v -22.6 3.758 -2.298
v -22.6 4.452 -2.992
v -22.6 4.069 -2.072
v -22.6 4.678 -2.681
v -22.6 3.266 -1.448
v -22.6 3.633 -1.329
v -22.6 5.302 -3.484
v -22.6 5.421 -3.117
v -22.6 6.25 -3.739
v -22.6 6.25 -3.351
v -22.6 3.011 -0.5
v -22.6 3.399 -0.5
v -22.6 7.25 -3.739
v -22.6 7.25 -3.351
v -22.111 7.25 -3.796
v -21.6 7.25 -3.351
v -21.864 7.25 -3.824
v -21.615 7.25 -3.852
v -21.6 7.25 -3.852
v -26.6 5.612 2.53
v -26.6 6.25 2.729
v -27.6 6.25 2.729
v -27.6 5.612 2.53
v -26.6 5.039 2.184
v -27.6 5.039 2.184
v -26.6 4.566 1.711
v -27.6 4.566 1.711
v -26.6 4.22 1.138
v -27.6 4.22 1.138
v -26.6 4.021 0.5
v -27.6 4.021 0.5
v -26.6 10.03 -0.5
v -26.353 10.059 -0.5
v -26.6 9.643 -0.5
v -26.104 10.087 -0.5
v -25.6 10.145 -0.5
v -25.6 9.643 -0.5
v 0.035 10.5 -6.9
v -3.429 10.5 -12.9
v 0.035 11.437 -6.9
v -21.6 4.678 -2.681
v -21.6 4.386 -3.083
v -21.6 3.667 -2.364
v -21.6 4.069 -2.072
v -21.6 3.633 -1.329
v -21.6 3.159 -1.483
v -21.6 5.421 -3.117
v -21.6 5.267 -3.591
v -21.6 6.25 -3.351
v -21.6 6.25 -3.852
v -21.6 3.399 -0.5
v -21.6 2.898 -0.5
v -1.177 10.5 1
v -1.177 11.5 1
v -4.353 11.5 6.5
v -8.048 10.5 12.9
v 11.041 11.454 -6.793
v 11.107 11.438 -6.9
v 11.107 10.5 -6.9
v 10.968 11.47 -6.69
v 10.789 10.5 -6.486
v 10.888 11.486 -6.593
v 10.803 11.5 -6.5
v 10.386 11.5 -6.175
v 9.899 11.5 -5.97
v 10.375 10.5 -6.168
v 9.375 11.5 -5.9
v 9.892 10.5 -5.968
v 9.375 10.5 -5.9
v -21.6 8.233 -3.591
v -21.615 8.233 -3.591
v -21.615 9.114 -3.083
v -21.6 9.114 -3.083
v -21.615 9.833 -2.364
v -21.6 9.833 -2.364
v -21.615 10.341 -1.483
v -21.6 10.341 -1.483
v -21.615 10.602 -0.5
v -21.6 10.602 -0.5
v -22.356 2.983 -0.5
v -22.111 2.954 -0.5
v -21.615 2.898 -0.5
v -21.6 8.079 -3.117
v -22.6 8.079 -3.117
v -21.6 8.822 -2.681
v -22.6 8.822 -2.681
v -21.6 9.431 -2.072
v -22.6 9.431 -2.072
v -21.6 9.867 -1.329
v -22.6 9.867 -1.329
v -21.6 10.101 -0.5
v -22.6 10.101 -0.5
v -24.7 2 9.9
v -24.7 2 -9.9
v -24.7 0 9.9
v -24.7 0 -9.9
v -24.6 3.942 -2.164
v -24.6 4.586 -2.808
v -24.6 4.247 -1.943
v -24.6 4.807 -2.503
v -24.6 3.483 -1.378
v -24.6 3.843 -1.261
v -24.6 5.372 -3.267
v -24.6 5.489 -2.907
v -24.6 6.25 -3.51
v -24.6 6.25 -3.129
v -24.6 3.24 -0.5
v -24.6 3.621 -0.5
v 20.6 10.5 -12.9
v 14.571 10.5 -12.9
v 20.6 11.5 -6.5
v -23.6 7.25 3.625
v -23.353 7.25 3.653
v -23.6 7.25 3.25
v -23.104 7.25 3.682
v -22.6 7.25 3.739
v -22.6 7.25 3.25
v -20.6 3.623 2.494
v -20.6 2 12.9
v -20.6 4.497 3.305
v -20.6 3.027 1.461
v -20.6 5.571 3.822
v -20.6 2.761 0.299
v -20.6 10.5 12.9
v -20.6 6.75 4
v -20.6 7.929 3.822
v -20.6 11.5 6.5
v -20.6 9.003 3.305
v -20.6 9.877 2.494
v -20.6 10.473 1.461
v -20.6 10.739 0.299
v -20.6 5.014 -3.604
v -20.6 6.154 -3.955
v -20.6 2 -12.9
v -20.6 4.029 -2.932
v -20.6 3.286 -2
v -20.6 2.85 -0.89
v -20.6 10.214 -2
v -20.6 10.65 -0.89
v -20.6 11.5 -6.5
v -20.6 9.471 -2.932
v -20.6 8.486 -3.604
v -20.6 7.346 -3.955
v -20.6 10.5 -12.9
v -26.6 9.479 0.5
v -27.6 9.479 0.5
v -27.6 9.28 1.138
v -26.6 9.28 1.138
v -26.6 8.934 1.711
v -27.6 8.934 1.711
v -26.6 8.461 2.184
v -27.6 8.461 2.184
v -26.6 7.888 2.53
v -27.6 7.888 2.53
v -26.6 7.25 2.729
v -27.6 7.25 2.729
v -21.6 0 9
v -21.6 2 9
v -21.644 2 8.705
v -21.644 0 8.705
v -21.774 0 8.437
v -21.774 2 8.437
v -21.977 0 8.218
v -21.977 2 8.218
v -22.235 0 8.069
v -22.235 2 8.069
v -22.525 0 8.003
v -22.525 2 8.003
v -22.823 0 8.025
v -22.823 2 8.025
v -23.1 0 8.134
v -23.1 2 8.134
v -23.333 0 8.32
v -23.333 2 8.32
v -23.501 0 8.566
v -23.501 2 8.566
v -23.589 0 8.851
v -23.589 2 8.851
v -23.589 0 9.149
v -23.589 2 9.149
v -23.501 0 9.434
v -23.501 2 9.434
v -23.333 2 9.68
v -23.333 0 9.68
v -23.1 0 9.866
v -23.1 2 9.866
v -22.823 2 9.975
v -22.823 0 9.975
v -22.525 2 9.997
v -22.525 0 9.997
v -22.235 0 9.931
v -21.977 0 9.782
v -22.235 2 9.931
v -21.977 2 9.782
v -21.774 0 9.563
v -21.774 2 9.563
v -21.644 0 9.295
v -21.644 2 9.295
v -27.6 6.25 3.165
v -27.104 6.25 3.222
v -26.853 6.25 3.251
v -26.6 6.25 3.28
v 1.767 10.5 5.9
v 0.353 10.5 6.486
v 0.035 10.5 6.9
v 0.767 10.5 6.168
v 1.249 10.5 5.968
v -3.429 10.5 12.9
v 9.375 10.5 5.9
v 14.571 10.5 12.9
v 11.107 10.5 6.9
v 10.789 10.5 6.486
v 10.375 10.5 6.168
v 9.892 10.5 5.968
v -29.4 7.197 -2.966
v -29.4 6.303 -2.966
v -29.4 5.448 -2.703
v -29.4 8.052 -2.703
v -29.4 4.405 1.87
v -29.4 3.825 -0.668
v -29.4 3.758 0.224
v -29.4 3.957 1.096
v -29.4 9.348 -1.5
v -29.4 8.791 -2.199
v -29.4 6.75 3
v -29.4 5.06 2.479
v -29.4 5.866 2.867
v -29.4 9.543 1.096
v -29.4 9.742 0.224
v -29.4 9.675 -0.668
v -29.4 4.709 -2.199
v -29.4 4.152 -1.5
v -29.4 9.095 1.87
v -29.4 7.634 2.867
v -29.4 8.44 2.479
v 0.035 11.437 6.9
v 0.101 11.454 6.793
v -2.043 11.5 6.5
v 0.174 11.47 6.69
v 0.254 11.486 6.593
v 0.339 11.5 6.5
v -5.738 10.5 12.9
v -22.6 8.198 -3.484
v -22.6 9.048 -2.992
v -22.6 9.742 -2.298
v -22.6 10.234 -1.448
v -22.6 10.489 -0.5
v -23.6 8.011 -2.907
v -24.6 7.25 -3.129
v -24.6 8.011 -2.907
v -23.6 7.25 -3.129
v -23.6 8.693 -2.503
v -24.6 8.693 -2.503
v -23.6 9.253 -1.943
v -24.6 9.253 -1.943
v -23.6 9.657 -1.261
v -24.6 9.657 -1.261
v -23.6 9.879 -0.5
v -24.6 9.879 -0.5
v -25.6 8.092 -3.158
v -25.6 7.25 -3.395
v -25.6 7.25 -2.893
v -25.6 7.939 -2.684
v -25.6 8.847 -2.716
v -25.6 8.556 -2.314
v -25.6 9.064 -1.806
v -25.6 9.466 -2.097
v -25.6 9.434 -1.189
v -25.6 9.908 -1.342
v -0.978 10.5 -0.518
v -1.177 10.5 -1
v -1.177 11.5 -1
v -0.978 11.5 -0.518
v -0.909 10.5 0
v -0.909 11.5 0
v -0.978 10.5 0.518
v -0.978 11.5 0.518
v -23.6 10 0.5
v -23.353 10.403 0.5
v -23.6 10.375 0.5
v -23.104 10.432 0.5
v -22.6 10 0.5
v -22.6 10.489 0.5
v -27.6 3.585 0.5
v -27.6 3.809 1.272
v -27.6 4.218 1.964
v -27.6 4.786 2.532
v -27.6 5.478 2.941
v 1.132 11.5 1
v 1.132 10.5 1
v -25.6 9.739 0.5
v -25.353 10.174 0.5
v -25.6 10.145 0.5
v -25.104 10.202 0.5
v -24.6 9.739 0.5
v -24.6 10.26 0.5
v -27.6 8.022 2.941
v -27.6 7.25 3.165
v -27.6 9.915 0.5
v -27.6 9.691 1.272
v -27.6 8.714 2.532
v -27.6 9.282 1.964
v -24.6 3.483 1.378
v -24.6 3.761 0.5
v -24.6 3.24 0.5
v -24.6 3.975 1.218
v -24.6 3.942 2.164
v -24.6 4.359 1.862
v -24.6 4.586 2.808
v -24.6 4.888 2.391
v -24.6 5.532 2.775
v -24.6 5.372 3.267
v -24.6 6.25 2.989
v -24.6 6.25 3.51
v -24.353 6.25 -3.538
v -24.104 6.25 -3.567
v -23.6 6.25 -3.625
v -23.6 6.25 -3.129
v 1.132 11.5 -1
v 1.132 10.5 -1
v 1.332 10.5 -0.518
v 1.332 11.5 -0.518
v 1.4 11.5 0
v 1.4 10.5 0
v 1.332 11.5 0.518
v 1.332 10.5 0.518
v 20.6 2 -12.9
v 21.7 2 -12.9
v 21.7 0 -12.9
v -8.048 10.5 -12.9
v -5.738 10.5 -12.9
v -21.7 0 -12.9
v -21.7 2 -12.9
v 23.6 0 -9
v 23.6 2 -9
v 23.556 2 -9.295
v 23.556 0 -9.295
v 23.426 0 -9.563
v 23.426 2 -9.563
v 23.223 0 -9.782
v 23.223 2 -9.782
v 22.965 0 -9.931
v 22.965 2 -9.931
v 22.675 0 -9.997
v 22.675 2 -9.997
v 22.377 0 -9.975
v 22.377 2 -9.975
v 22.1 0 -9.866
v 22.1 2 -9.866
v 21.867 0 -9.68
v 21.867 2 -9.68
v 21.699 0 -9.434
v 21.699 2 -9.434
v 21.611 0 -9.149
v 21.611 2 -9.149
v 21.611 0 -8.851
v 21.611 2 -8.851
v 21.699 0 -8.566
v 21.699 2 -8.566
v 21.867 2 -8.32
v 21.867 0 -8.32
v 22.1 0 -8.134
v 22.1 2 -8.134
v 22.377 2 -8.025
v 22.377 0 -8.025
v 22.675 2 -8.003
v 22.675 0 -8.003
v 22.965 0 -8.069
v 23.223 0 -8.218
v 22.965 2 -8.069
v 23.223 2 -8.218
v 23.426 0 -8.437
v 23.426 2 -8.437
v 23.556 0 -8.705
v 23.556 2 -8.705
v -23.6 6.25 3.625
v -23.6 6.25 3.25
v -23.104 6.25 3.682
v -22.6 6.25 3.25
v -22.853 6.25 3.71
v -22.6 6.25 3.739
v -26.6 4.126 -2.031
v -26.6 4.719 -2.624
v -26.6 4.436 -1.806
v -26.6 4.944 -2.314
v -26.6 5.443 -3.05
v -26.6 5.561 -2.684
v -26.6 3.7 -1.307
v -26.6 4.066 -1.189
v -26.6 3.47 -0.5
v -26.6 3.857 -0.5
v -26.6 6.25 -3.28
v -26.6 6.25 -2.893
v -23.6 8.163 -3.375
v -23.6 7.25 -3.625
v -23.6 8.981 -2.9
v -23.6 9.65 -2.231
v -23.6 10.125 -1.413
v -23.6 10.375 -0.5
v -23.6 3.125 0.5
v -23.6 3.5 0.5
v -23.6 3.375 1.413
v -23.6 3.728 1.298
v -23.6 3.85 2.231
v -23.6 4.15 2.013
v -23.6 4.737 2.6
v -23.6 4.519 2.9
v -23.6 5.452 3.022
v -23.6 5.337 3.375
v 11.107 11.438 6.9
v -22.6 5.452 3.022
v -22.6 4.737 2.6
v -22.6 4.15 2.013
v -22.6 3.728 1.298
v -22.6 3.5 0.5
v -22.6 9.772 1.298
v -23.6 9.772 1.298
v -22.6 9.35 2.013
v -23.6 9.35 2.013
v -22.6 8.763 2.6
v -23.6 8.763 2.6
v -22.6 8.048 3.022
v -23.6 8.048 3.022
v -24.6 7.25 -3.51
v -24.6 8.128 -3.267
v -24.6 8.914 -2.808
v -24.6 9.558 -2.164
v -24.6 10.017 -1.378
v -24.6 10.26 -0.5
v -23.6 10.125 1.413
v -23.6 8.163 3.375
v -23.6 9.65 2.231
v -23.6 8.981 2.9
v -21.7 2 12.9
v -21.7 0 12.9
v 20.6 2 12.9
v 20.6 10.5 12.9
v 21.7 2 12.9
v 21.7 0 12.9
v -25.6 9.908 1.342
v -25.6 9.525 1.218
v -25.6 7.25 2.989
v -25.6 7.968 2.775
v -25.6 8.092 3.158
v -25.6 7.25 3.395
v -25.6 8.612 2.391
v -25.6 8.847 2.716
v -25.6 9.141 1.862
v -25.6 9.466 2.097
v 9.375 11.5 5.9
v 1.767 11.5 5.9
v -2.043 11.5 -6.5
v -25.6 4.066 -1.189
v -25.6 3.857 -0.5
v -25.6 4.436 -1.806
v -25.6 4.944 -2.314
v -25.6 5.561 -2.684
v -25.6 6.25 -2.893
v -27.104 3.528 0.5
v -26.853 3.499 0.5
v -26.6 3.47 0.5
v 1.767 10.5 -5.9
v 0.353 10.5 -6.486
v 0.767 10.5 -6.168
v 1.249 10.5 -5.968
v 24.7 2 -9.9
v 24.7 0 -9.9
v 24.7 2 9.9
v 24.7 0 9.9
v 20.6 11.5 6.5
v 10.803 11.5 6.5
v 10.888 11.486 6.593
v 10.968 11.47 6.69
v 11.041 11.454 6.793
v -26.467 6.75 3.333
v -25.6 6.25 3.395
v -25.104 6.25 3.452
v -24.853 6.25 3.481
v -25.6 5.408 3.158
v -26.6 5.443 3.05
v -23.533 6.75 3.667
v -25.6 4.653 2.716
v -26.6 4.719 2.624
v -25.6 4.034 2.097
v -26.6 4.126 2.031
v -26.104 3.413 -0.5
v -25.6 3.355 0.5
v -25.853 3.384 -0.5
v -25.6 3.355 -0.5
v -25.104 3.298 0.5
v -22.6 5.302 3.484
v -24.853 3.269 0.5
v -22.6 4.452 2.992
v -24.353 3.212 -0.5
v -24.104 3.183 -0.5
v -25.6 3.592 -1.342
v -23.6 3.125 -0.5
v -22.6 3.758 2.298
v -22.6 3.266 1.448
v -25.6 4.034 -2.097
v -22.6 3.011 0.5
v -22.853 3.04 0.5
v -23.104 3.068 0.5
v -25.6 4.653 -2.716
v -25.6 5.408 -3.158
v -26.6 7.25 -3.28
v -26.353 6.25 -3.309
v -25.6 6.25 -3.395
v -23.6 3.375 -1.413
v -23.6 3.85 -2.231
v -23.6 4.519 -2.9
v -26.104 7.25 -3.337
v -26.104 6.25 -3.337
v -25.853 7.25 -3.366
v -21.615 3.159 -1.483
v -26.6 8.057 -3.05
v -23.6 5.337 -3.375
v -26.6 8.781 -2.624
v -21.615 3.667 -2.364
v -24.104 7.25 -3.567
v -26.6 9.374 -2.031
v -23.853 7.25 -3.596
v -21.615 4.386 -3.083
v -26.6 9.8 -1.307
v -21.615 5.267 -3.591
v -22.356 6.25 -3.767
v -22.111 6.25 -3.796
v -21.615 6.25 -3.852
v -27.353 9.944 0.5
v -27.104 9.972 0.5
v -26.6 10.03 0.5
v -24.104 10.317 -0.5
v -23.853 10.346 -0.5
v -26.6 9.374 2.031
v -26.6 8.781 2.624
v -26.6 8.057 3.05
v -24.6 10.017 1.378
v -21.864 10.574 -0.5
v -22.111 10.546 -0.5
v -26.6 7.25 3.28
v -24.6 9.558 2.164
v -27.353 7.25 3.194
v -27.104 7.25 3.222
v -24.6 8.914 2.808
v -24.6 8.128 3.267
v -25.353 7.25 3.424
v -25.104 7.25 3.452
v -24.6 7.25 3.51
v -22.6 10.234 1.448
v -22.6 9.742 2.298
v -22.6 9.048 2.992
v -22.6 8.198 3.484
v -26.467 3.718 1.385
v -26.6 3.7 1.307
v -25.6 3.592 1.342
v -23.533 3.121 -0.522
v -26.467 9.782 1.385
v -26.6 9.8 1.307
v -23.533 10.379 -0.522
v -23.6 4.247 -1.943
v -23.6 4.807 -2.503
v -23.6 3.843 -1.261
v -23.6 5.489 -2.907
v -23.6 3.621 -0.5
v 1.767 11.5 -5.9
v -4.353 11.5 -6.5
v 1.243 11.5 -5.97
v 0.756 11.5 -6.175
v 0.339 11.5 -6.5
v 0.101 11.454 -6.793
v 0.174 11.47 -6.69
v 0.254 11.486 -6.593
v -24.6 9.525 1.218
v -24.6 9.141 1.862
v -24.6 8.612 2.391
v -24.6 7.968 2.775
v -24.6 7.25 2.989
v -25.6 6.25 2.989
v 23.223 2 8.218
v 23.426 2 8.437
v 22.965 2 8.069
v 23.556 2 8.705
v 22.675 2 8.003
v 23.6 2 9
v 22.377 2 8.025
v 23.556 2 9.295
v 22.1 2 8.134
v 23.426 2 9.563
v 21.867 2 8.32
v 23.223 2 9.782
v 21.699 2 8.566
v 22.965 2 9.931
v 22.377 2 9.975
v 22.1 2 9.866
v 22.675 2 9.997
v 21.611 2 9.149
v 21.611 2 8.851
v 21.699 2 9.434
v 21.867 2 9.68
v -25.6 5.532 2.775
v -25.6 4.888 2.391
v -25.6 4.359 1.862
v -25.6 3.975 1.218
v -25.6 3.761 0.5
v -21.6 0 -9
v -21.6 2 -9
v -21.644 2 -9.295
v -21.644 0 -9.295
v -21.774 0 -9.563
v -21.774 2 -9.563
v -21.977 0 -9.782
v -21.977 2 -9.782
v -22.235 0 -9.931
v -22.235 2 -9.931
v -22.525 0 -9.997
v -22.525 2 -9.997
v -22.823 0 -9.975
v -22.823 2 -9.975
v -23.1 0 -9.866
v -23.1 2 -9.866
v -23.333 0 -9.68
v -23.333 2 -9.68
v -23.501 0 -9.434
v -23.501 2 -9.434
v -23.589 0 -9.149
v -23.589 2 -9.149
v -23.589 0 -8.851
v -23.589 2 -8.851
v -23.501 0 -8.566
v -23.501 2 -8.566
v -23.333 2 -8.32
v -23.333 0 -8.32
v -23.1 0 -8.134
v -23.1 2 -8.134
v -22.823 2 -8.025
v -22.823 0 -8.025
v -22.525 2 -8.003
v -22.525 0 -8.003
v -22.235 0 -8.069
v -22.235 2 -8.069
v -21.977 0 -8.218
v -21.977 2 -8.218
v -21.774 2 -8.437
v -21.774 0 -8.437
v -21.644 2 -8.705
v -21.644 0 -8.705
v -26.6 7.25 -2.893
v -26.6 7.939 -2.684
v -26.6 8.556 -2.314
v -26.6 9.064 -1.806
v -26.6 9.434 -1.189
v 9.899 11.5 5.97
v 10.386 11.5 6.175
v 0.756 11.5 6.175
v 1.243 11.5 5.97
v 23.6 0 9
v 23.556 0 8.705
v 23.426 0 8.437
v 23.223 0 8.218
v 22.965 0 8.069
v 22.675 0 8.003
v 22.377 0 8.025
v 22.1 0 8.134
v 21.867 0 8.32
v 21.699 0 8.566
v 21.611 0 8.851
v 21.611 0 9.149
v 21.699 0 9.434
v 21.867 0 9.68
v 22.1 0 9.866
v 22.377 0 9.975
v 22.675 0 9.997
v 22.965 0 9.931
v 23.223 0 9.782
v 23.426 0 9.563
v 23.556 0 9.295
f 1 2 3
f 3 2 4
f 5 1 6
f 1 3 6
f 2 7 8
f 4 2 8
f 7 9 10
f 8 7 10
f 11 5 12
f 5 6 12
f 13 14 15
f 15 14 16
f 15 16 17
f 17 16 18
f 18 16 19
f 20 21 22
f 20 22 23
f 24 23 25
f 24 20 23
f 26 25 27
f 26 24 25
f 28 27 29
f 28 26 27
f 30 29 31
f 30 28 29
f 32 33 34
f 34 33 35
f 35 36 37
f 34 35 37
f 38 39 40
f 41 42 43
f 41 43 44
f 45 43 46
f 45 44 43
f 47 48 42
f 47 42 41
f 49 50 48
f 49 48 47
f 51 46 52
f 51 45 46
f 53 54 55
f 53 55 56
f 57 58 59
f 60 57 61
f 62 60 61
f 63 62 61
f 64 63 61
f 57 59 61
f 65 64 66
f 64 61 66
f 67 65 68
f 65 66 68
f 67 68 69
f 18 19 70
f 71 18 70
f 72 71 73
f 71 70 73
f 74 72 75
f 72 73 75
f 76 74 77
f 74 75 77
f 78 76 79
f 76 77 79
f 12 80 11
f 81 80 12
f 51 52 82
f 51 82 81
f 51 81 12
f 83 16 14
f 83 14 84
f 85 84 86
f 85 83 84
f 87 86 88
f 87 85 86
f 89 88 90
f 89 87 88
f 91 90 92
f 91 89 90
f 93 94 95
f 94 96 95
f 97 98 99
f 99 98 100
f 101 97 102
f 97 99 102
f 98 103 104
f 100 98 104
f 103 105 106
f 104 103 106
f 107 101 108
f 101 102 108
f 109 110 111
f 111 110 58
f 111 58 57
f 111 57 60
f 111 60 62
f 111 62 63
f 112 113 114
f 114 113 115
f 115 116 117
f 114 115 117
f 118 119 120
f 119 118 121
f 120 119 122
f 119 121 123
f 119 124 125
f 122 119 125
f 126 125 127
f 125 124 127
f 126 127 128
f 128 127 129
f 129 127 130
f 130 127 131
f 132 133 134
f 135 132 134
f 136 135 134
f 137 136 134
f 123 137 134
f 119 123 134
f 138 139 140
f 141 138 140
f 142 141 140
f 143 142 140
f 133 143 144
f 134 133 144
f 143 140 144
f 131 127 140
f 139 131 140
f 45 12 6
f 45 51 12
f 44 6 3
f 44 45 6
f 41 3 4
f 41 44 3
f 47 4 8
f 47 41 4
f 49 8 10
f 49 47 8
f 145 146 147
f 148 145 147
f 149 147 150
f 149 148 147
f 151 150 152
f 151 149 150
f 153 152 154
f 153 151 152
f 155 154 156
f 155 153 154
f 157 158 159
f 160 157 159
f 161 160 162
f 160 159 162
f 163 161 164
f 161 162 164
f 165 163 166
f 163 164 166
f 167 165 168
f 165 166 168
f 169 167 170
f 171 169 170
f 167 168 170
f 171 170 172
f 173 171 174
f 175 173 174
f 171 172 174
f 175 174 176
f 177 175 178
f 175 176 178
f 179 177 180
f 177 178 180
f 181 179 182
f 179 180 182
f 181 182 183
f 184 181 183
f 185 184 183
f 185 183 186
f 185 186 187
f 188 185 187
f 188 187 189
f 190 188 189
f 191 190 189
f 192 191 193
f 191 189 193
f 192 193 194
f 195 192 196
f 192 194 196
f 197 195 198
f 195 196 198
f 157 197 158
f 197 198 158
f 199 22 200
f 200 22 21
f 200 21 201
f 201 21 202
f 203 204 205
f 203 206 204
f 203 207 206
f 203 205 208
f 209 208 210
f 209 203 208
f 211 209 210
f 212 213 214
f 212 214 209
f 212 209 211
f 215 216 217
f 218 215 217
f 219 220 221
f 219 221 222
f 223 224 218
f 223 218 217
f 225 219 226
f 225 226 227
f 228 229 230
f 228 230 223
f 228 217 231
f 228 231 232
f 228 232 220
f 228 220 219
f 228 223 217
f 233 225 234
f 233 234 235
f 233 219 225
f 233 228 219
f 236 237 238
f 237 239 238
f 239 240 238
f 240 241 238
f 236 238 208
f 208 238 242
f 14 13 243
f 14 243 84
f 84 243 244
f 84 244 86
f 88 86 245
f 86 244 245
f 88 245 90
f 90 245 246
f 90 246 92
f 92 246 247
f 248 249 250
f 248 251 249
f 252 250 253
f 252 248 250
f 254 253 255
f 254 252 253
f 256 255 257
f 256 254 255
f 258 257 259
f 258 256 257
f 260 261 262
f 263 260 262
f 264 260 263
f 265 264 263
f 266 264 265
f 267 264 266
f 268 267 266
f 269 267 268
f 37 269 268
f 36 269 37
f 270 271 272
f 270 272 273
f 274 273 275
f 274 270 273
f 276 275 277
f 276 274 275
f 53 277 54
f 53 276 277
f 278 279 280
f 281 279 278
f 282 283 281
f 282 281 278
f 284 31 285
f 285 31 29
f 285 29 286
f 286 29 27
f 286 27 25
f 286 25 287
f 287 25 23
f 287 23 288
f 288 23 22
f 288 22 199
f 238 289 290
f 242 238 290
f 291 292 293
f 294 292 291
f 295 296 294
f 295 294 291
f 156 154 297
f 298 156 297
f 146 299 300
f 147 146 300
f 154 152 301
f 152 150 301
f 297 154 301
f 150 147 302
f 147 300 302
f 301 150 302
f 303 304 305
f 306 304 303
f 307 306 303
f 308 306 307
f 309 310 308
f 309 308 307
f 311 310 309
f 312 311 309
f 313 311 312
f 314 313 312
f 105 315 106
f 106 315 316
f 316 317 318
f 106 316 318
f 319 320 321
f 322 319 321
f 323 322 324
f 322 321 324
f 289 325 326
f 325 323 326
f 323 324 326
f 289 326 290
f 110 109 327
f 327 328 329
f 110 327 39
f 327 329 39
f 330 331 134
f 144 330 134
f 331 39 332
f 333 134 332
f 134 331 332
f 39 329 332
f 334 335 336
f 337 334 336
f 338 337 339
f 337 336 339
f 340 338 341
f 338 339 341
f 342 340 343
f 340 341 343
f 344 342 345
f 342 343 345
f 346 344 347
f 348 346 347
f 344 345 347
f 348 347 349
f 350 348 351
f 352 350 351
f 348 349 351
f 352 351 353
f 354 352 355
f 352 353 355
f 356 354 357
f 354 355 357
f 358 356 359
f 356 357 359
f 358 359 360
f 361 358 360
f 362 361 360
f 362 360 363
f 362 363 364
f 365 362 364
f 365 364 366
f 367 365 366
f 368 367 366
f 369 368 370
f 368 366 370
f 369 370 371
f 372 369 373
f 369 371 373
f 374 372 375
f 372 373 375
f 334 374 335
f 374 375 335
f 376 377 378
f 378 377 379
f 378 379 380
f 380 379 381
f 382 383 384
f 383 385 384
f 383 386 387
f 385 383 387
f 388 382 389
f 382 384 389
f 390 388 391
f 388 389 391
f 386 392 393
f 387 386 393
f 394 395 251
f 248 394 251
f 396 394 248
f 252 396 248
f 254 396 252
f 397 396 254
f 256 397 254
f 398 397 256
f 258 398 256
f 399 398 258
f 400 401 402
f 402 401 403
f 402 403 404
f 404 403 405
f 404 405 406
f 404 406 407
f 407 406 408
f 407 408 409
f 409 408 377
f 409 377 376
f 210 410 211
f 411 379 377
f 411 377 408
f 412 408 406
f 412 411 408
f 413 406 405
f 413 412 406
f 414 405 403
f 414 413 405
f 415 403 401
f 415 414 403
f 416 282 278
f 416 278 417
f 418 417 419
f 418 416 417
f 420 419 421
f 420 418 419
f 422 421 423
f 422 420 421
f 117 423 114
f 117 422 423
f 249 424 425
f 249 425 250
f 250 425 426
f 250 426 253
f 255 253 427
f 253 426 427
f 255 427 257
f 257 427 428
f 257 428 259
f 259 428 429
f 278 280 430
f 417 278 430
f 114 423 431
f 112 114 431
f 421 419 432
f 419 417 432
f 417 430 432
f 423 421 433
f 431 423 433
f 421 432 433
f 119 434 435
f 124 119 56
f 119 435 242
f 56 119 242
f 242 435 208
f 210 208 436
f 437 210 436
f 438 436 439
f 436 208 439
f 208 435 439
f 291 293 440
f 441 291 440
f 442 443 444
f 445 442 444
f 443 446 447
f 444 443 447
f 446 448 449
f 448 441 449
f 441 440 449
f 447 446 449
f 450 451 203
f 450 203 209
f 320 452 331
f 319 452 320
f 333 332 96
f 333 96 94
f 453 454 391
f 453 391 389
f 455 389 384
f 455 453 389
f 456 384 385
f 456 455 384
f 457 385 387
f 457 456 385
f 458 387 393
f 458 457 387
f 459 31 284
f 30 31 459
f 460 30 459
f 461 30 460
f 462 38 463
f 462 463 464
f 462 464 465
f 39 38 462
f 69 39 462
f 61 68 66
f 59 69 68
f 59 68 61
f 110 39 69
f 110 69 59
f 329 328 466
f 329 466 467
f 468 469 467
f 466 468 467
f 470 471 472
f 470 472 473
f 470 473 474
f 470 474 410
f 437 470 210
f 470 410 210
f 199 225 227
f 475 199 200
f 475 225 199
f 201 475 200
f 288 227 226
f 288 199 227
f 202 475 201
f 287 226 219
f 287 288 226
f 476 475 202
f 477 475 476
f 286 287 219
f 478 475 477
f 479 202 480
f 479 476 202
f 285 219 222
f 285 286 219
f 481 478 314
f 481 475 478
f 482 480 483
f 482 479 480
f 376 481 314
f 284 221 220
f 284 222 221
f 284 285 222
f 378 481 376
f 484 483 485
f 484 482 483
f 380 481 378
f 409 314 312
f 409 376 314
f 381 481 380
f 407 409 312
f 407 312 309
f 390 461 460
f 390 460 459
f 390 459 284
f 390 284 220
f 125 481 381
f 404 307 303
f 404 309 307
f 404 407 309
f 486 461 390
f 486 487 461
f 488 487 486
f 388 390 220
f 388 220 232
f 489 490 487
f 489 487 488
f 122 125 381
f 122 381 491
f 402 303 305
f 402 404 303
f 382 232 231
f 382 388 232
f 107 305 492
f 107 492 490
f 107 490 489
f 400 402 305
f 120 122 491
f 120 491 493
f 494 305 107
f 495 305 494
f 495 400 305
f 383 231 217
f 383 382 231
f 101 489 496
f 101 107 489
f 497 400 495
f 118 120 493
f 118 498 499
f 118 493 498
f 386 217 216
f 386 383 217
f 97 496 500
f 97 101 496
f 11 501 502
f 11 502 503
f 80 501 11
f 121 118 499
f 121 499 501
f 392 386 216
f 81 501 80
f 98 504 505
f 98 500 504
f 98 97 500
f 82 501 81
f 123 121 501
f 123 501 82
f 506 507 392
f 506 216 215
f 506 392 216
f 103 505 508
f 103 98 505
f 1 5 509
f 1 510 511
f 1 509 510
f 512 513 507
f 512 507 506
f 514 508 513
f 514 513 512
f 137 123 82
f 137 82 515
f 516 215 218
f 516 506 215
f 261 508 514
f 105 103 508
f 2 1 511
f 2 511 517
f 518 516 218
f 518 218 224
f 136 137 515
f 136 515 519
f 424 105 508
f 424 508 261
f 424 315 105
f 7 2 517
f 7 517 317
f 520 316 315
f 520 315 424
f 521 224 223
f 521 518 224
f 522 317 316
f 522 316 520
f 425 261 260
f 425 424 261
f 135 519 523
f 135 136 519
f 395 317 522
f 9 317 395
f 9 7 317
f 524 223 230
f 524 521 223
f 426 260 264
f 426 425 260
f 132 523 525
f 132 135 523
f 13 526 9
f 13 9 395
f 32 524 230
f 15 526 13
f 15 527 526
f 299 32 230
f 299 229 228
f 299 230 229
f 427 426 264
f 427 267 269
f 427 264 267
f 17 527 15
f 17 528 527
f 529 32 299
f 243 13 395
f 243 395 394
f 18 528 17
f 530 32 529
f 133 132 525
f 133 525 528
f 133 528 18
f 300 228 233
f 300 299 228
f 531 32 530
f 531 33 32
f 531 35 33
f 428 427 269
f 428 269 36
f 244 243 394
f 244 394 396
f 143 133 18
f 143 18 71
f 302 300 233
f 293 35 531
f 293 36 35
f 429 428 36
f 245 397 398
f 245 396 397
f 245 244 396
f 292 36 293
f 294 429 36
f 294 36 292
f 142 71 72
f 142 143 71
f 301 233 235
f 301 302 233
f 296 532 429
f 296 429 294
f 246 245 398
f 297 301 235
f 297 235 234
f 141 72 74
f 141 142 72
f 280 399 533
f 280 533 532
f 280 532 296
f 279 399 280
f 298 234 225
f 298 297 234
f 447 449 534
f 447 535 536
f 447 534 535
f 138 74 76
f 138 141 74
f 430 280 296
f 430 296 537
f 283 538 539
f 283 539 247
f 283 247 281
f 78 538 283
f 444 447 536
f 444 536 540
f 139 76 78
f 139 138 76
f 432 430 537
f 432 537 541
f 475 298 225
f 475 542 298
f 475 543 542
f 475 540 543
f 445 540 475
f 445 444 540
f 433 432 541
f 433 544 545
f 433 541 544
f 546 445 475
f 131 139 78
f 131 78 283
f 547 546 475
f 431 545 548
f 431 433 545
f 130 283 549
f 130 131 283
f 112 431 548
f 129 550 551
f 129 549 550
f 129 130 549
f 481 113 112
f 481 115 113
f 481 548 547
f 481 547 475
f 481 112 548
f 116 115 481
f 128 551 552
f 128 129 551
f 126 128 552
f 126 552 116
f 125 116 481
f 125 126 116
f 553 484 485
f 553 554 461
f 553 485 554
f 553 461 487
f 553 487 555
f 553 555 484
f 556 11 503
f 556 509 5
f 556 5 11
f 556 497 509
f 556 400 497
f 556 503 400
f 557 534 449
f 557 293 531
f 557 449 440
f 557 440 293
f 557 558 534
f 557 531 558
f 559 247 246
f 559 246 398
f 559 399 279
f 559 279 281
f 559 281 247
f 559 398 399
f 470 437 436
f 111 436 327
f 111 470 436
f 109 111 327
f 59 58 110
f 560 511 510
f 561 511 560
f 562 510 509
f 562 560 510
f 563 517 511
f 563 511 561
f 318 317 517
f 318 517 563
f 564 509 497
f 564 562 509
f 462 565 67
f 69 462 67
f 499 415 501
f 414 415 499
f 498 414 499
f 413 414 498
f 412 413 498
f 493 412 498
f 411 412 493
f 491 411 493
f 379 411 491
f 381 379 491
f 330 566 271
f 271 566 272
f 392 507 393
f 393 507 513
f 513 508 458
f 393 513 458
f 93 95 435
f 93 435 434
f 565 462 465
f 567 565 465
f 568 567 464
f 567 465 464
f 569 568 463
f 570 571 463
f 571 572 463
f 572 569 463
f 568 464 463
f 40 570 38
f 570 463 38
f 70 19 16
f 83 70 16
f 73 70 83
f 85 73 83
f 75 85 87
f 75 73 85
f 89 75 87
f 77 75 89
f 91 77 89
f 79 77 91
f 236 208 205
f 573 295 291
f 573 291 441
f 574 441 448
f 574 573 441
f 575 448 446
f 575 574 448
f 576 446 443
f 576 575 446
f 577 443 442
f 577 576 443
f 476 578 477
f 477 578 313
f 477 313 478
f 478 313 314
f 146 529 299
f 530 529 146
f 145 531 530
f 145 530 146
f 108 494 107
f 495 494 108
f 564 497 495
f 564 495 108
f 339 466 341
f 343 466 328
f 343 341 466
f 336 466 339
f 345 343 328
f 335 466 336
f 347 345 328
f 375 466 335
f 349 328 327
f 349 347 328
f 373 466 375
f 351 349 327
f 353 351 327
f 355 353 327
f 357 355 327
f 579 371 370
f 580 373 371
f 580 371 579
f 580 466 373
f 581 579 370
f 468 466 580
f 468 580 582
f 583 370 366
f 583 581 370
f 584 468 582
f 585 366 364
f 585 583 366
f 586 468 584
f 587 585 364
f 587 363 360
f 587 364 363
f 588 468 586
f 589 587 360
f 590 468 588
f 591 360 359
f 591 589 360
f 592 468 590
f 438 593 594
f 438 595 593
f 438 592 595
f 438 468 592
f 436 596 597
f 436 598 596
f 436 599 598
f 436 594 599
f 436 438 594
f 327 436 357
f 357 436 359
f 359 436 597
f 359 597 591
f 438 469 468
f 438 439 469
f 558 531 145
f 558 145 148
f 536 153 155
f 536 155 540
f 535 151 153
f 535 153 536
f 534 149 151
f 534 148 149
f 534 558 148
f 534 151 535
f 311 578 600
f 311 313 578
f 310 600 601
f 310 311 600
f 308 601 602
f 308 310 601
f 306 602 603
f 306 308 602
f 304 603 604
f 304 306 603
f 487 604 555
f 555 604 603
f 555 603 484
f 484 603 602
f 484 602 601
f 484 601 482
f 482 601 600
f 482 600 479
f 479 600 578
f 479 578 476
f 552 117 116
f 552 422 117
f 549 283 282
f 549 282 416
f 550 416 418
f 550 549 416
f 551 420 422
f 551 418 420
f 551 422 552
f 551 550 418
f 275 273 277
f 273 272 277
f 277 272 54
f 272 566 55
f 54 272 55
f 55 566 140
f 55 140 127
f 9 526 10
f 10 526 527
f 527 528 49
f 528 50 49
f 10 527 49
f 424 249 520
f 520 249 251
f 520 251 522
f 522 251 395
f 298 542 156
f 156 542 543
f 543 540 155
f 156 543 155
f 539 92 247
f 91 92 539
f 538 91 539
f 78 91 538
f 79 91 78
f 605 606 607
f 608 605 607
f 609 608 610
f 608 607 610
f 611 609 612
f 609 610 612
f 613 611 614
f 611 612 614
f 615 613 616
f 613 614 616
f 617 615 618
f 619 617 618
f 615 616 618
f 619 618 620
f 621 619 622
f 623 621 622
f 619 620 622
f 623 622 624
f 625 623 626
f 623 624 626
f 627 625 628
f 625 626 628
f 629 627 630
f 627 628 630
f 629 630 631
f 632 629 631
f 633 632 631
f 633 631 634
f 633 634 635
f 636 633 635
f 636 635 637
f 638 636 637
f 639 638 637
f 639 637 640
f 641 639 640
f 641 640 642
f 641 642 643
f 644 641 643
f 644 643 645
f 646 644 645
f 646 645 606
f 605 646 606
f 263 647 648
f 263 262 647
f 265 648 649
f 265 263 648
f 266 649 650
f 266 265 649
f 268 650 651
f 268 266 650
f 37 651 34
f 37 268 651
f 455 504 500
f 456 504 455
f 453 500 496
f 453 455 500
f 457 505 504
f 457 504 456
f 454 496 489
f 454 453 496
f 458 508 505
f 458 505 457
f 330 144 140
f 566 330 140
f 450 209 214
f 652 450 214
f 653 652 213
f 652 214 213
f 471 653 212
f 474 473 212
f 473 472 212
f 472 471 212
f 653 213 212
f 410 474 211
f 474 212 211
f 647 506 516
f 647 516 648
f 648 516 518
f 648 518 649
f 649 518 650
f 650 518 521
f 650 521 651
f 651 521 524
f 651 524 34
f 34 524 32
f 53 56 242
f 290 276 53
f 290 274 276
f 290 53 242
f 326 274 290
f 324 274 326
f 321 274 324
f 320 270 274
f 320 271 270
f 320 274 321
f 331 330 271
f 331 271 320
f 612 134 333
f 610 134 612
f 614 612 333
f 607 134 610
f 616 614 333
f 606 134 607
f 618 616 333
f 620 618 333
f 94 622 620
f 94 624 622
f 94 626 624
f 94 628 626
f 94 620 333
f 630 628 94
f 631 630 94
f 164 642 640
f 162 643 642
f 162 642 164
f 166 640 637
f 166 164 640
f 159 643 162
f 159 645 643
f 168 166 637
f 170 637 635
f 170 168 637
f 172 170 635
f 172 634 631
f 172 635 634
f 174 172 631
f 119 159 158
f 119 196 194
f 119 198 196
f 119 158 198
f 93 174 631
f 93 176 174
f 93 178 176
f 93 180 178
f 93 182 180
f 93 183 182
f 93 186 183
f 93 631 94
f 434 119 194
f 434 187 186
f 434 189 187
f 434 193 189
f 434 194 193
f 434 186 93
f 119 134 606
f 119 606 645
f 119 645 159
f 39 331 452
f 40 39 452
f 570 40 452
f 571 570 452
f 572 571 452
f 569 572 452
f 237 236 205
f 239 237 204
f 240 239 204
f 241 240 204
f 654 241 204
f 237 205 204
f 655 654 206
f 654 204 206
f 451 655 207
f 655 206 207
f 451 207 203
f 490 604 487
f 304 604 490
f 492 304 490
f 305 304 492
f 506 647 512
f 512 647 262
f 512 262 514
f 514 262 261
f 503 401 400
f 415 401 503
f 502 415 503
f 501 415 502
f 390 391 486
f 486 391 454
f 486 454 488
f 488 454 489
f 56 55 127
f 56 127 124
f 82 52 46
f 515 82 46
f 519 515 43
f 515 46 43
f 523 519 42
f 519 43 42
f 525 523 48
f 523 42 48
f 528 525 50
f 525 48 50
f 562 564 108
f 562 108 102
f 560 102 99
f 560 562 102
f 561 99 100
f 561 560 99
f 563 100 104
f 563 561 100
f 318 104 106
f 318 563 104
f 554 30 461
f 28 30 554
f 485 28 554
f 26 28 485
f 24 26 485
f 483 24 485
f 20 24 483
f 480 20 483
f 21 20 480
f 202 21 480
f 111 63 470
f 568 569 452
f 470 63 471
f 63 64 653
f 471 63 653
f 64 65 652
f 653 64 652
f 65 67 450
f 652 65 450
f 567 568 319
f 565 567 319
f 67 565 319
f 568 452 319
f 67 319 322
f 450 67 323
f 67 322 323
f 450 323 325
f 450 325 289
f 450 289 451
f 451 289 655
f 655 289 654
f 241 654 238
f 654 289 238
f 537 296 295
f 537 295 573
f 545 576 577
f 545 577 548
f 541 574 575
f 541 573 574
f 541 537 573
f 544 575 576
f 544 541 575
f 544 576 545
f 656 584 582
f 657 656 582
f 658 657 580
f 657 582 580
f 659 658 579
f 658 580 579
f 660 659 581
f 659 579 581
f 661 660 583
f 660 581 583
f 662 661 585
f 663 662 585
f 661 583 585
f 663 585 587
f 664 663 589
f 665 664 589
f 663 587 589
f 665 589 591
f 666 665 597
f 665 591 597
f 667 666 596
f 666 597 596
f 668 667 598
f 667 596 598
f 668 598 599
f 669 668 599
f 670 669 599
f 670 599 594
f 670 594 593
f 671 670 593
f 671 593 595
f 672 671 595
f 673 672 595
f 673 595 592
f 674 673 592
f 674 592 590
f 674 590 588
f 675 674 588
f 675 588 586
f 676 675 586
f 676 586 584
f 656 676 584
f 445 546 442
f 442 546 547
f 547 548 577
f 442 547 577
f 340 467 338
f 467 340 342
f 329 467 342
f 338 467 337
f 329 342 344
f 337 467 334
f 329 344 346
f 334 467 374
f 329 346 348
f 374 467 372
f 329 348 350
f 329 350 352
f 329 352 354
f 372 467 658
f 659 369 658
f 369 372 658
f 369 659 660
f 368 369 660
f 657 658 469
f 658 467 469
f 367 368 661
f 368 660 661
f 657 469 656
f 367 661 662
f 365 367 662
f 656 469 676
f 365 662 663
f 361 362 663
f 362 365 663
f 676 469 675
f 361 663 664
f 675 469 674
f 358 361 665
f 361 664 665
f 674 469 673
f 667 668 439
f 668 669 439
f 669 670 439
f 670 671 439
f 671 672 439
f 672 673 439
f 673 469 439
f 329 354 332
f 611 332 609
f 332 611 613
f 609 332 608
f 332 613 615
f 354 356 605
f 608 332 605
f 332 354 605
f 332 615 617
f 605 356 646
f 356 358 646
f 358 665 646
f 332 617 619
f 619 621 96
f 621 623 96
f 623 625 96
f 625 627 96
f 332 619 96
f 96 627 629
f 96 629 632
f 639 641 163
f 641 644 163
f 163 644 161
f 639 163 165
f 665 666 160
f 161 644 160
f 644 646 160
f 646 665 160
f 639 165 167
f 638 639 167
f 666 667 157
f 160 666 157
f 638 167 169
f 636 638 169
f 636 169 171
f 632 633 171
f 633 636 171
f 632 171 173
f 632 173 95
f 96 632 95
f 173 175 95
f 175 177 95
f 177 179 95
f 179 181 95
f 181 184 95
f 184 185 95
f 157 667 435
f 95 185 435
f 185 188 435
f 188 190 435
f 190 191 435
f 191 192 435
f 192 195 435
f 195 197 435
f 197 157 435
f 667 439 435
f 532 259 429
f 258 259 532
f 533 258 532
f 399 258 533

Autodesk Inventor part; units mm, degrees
sketch "Sketch1" plane through (0, 0, 0) normal (0, 1, 0) x (-1, 0, 0)
  line L0 (-24.7, -12.9) -> (24.7, -12.9)
  line L1 (24.7, -12.9) -> (24.7, 12.9)
  line L2 (24.7, 12.9) -> (-24.7, 12.9)
  line L3 (-24.7, 12.9) -> (-24.7, -12.9)
  line L4 (-24.7, -12.9) -> (24.7, 12.9) construction
  line L5 (24.7, -12.9) -> (-24.7, 12.9) construction
  point P0 (0, 0)
  dimension "d0" = 49.4
  dimension "d1" = 25.8
extrude "Extrusion1" add sketch "Sketch1" along normal blind 2
chamfer "Chamfer1" distance 3 angle 45 4 edges at (24.7, 1, 12.9) (24.7, 1, -12.9) (-24.7, 1, 12.9) (-24.7, 1, -12.9)
sketch "Sketch2" plane through (0, 2, 0) normal (0, 1, 0) x (1, 0, 0)
  circle A0 centre (22.6, -9) radius 1
  circle A1 centre (22.6, 9) radius 1
  circle A2 centre (-22.6, -9) radius 1
  circle A3 centre (-22.6, 9) radius 1
  line L0 (24.7, -9.9) -> (24.7, 9.9) construction
  line L1 (24.7, 0) -> (-24.7, 0) construction
  line L2 (-24.7, 9.9) -> (-24.7, -9.9) construction
  line L3 (-21.7, -12.9) -> (21.7, -12.9) construction
  line L4 (0, -12.9) -> (0, 13.4418) construction
  point P0 (0, 0)
  dimension "d7" = 2
  dimension "d8" = 45.2
  dimension "d9" = 18
extrude "Extrusion2" cut sketch "Sketch2" against normal up to surface (2 mm away)
ref_plane "Work Plane1" through (0, 0, 9.9) normal (1, 0, 0) x (0, 0, -1)
sketch "Sketch3" plane through (0, 0, 9.9) normal (1, 0, 0) x (0, 0, -1)
  line L0 (22.8, 2) -> (19.8, 2) projected
  line L1 (22.8, 2) -> (22.8, 10.5)
  line L2 (22.8, 10.5) -> (16.4, 11.5)
  line L3 (16.4, 11.5) -> (3.4, 11.5)
  line L4 (3.4, 11.5) -> (-3, 10.5)
  line L5 (-3, 10.5) -> (-3, 2)
  line L6 (-0.1, 2) -> (1.9, 2) projected
  line L7 (22.8, 2) -> (-3, 2)
  line L8 (22.8, 0) -> (22.8, 2) projected
  line L9 (-3, 2) -> (-3, 0) projected
  line L10 (0, 0) -> (19.8, 0) projected
  line L11 (9.9, 0) -> (9.9, 11.5) construction
  line L12 (-3, 0) -> (0, 0) construction
  dimension "d12" = 11.5
  dimension "d13" = 13
  dimension "d14" = 10.5
extrude "Extrusion3" add sketch "Sketch3" along normal mid plane 41.2
sketch "Sketch4" plane through (-20.6, 11.5, 6.5) normal (0, 1, 0) x (1, 0, 0)
  line L0 (42.3, 19.4) -> (-1.1, 19.4) projected
  line L1 (12.5522, 19.4) -> (20, 6.5)
  line L2 (20, 6.5) -> (12.5522, -6.4)
  line L3 (-1.1, -6.4) -> (42.3, -6.4) projected
  line L4 (14.8616, 19.4) -> (22.3094, 6.5)
  line L5 (22.3094, 6.5) -> (14.8616, -6.4)
  line L6 (12.5522, -6.4) -> (14.8616, -6.4)
  line L7 (12.5522, 19.4) -> (14.8616, 19.4)
  line L8 (20.6, 6.5) -> (-4.1, 6.5) construction
  line L9 (-4.1, 16.4) -> (-4.1, -3.4) construction
  line L10 (0, 0) -> (0, 13) construction
  line L11 (17.171, 19.4) -> (21.2124, 12.4)
  line L12 (21.2124, 12.4) -> (31.1295, 12.4)
  line L13 (31.1295, 12.4) -> (35.171, 19.4)
  line L14 (26.171, 12.4) -> (26.171, 19.4) construction
  line L15 (17.171, -6.4) -> (21.2124, 0.6)
  line L16 (21.2124, 0.6) -> (31.1295, 0.6)
  line L17 (31.1295, 0.6) -> (35.171, -6.4)
  point P0 (35.171, -6.4)
  dimension "d17" = 2
  dimension "d18" = 2
  dimension "d19" = 120
  dimension "d20" = 20
  dimension "d21" = 2
  dimension "d22" = 7
  dimension "d23" = 18
extrude "Extrusion4" cut sketch "Sketch4" against normal blind 1
fillet "Fillet1" radius 2 6 edges at (1.7094, 11, 0) (-0.6, 11, 0) (0.6124, 11, 5.9) (10.5295, 11, 5.9) (10.5295, 11, -5.9) (0.6124, 11, -5.9)
sketch "Sketch6" plane through (-20.6, 0, 9.9) normal (-1, 0, 0) x (0, 0, 1)
  circle A0 centre (-9.9, 6.75) radius 4
  line L0 (-16.4, 11.5) -> (-3.4, 11.5) construction
  line L1 (-9.9, 11.5) -> (-9.9, 0) construction
  line L2 (-22.8, 2) -> (-22.8, 10.5) construction
  line L3 (-22.8, 6.75) -> (3, 6.75) construction
  line L4 (3, 10.5) -> (3, 2) construction
  point P0 (-9.9, 6.75)
  dimension "d27" = 8
  dimension "d28" = 4.75
ref_plane "Work Plane2" through (-29.4, 0, 9.9) normal (-1, 0, 0) x (0, 0, 1)
sketch "Sketch7" plane through (-29.4, 0, 9.9) normal (-1, 0, 0) x (0, 0, 1)
  circle A0 centre (-9.9, 6.75) radius 3
  point P0 (-9.9, 0)
  dimension "d30" = 6
loft "Loft1" add profiles "Sketch6", "Sketch7"
ref_plane "Work Plane3" through (-21.6, 0, 9.9) normal (-1, 0, 0) x (0, 0, 1)
sketch "Sketch8" plane through (-21.6, 0, 9.9) normal (-1, 0, 0) x (0, 0, 1)
  circle A0 centre (-9.9, 6.75) radius 4 projected
  circle A1 centre (-9.9, 6.75) radius 3.8847
  circle A2 centre (-9.9, 6.75) radius 3.388
  line L0 (-9.4, 2.75) -> (-10.4, 2.75)
  line L1 (-10.4, 2.75) -> (-10.4, 10.75)
  line L2 (-10.4, 10.75) -> (-9.4, 10.75)
  line L3 (-9.4, 10.75) -> (-9.4, 2.75)
  line L4 (-9.4, 2.75) -> (-10.4, 10.75) construction
  line L5 (-10.4, 2.75) -> (-9.4, 10.75) construction
  line L6 (-5.9, 7.25) -> (-13.9, 7.25)
  line L7 (-13.9, 7.25) -> (-13.9, 6.25)
  line L8 (-13.9, 6.25) -> (-5.9, 6.25)
  line L9 (-5.9, 6.25) -> (-5.9, 7.25)
  line L10 (-5.9, 7.25) -> (-13.9, 6.25) construction
  line L11 (-13.9, 7.25) -> (-5.9, 6.25) construction
  point P0 (-9.9, 0)
  point P1 (-13.2509, 6.25)
  point P2 (-13.7524, 6.25)
  point P3 (-10.4, 2.8976)
  point P4 (-10.4, 3.3991)
  point P5 (-13.7524, 7.25)
  point P6 (-13.2509, 7.25)
  point P7 (-10.4, 10.1009)
  point P8 (-10.4, 10.6024)
  dimension "d36" = 6.776
  dimension "d37" = 1
  dimension "d38" = 1
extrude "Extrusion5" cut sketch "Sketch8" along normal blind 1 contours L1 A2 L6 A1 | A1 L8 A2 L1
ref_plane "Work Plane4" through (-22.6, 0, 9.9) normal (-1, 0, 0) x (0, 0, 1)
sketch "Sketch9" plane through (-22.6, 0, 9.9) normal (-1, 0, 0) x (0, 0, 1)
  circle A0 centre (-9.9, 6.75) radius 4 projected
  circle A1 centre (-9.9, 6.75) radius 4
  circle A2 centre (-9.9, 6.75) radius 3.2885
  line L0 (-9.4, 2.75) -> (-10.4, 2.75)
  line L1 (-10.4, 2.75) -> (-10.4, 10.75)
  line L2 (-10.4, 10.75) -> (-9.4, 10.75)
  line L3 (-9.4, 10.75) -> (-9.4, 2.75)
  line L4 (-9.4, 2.75) -> (-10.4, 10.75) construction
  line L5 (-10.4, 2.75) -> (-9.4, 10.75) construction
  line L6 (-5.9, 7.25) -> (-13.9, 7.25)
  line L7 (-13.9, 7.25) -> (-13.9, 6.25)
  line L8 (-13.9, 6.25) -> (-5.9, 6.25)
  line L9 (-5.9, 6.25) -> (-5.9, 7.25)
  line L10 (-5.9, 7.25) -> (-13.9, 6.25) construction
  line L11 (-13.9, 7.25) -> (-5.9, 6.25) construction
  point P0 (-9.9, 0)
  point P1 (-5.9314, 6.25)
  point P2 (-6.6497, 6.25)
  point P3 (-9.4, 3.4997)
  point P4 (-9.4, 2.7814)
  point P5 (-6.6497, 7.25)
  point P6 (-5.9314, 7.25)
  point P7 (-9.4, 10.7186)
  point P8 (-9.4, 10.0003)
  dimension "d42" = 6.577
  dimension "d43" = 1
  dimension "d44" = 1
  dimension "d45" = 8
extrude "Extrusion6" cut sketch "Sketch9" along normal blind 1 contours L6 A2 L3 A0 | A0 L3 A2 L8
ref_plane "Work Plane5" through (-23.6, 0, 9.9) normal (-1, 0, 0) x (0, 0, 1)
sketch "Sketch10" plane through (-23.6, 0, 9.9) normal (-1, 0, 0) x (0, 0, 1)
  circle A0 centre (-9.9, 6.75) radius 4 projected
  circle A1 centre (-9.9, 6.75) radius 3.169
  circle A2 centre (-9.9, 6.75) radius 3.9804
  line L0 (-9.4, 2.75) -> (-10.4, 2.75)
  line L1 (-10.4, 2.75) -> (-10.4, 10.75)
  line L2 (-10.4, 10.75) -> (-9.4, 10.75)
  line L3 (-9.4, 10.75) -> (-9.4, 2.75)
  line L4 (-9.4, 2.75) -> (-10.4, 10.75) construction
  line L5 (-10.4, 2.75) -> (-9.4, 10.75) construction
  line L6 (-5.9, 7.25) -> (-13.9, 7.25)
  line L7 (-13.9, 7.25) -> (-13.9, 6.25)
  line L8 (-13.9, 6.25) -> (-5.9, 6.25)
  line L9 (-5.9, 6.25) -> (-5.9, 7.25)
  line L10 (-5.9, 7.25) -> (-13.9, 6.25) construction
  line L11 (-13.9, 7.25) -> (-5.9, 6.25) construction
  point P0 (-9.9, 0)
  point P1 (-13.0293, 6.25)
  point P2 (-13.8489, 6.25)
  point P3 (-10.4, 2.8011)
  point P4 (-10.4, 3.6207)
  point P5 (-13.8489, 7.25)
  point P6 (-13.0293, 7.25)
  point P7 (-10.4, 9.8793)
  point P8 (-10.4, 10.6989)
  dimension "d49" = 6.338
  dimension "d50" = 1
  dimension "d51" = 1
extrude "Extrusion7" cut sketch "Sketch10" along normal blind 1 contours L1 A2 L6 A0 | L1 A1 L6 A2 | A0 L8 A2 L1 | A2 L8 A1 L1
ref_plane "Work Plane6" through (-24.6, 0, 9.9) normal (-1, 0, 0) x (0, 0, 1)
sketch "Sketch11" plane through (-24.6, 0, 9.9) normal (-1, 0, 0) x (0, 0, 1)
  circle A0 centre (-9.9, 6.75) radius 4 projected
  circle A1 centre (-9.9, 6.75) radius 3.924
  circle A2 centre (-9.9, 6.75) radius 3.0305
  line L0 (-9.4, 2.75) -> (-10.4, 2.75)
  line L1 (-10.4, 2.75) -> (-10.4, 10.75)
  line L2 (-10.4, 10.75) -> (-9.4, 10.75)
  line L3 (-9.4, 10.75) -> (-9.4, 2.75)
  line L4 (-9.4, 2.75) -> (-10.4, 10.75) construction
  line L5 (-10.4, 2.75) -> (-9.4, 10.75) construction
  line L6 (-5.9, 7.25) -> (-13.9, 7.25)
  line L7 (-13.9, 7.25) -> (-13.9, 6.25)
  line L8 (-13.9, 6.25) -> (-5.9, 6.25)
  line L9 (-5.9, 6.25) -> (-5.9, 7.25)
  line L10 (-5.9, 7.25) -> (-13.9, 6.25) construction
  line L11 (-13.9, 7.25) -> (-5.9, 6.25) construction
  point P0 (-9.9, 0)
  point P1 (-6.008, 6.25)
  point P2 (-6.911, 6.25)
  point P3 (-9.4, 3.761)
  point P4 (-9.4, 2.858)
  point P5 (-6.911, 7.25)
  point P6 (-6.008, 7.25)
  point P7 (-9.4, 10.642)
  point P8 (-9.4, 9.739)
  dimension "d55" = 6.061
  dimension "d56" = 1
  dimension "d57" = 1
extrude "Extrusion8" cut sketch "Sketch11" along normal blind 1 contours L6 A2 L3 A1 | A1 L3 A2 L8
ref_plane "Work Plane7" through (-25.6, 0, 9.9) normal (-1, 0, 0) x (0, 0, 1)
sketch "Sketch12" plane through (-25.6, 0, 9.9) normal (-1, 0, 0) x (0, 0, 1)
  circle A0 centre (-9.9, 6.75) radius 4 projected
  circle A1 centre (-9.9, 6.75) radius 4.1817
  circle A2 centre (-9.9, 6.75) radius 2.9355
  line L0 (-10.4, 2.5683) -> (-9.4, 2.5683)
  line L1 (-9.4, 2.5683) -> (-9.4, 10.9317)
  line L2 (-9.4, 10.9317) -> (-10.4, 10.9317)
  line L3 (-10.4, 10.9317) -> (-10.4, 2.5683)
  line L4 (-10.4, 2.5683) -> (-9.4, 10.9317) construction
  line L5 (-9.4, 2.5683) -> (-10.4, 10.9317) construction
  line L6 (-5.7183, 7.25) -> (-14.0817, 7.25)
  line L7 (-14.0817, 7.25) -> (-14.0817, 6.25)
  line L8 (-14.0817, 6.25) -> (-5.7183, 6.25)
  line L9 (-5.7183, 6.25) -> (-5.7183, 7.25)
  line L10 (-5.7183, 7.25) -> (-14.0817, 6.25) construction
  line L11 (-14.0817, 7.25) -> (-5.7183, 6.25) construction
  point P0 (-9.9, 0)
  point P1 (-12.7926, 6.25)
  point P2 (-13.8686, 6.25)
  point P3 (-10.4, 2.7814)
  point P4 (-10.4, 3.8574)
  point P5 (-13.8686, 7.25)
  point P6 (-12.7926, 7.25)
  point P7 (-10.4, 9.6426)
  point P8 (-10.4, 10.7186)
  dimension "d61" = 5.871
  dimension "d62" = 1
  dimension "d63" = 1
extrude "Extrusion9" cut sketch "Sketch12" along normal blind 1 contours L3 A2 L6 A0 | A0 L8 A2 L3
ref_plane "Work Plane8" through (-26.6, 0, 9.9) normal (-1, 0, 0) x (0, 0, 1)
sketch "Sketch13" plane through (-26.6, 0, 9.9) normal (-1, 0, 0) x (0, 0, 1)
  circle A0 centre (-9.9, 6.75) radius 4 projected
  circle A1 centre (-9.9, 6.75) radius 3.6503
  circle A2 centre (-9.9, 6.75) radius 2.774
  line L0 (-9.4, 3.0997) -> (-10.4, 3.0997)
  line L1 (-10.4, 3.0997) -> (-10.4, 10.4003)
  line L2 (-10.4, 10.4003) -> (-9.4, 10.4003)
  line L3 (-9.4, 10.4003) -> (-9.4, 3.0997)
  line L4 (-9.4, 3.0997) -> (-10.4, 10.4003) construction
  line L5 (-10.4, 3.0997) -> (-9.4, 10.4003) construction
  line L6 (-6.2497, 7.25) -> (-13.5503, 7.25)
  line L7 (-13.5503, 7.25) -> (-13.5503, 6.25)
  line L8 (-13.5503, 6.25) -> (-6.2497, 6.25)
  line L9 (-6.2497, 6.25) -> (-6.2497, 7.25)
  line L10 (-6.2497, 7.25) -> (-13.5503, 6.25) construction
  line L11 (-13.5503, 7.25) -> (-6.2497, 6.25) construction
  point P0 (-9.9, 0)
  point P1 (-6.2841, 6.25)
  point P2 (-7.1714, 6.25)
  point P3 (-9.4, 4.0214)
  point P4 (-9.4, 3.1341)
  point P5 (-7.1714, 7.25)
  point P6 (-6.2841, 7.25)
  point P7 (-9.4, 10.3659)
  point P8 (-9.4, 9.4786)
  dimension "d67" = 5.548
  dimension "d68" = 1
  dimension "d69" = 1
extrude "Extrusion10" cut sketch "Sketch13" along normal blind 1 contours L6 A2 L3 A1 | A1 L3 A2 L8
properties part number "ESC"
